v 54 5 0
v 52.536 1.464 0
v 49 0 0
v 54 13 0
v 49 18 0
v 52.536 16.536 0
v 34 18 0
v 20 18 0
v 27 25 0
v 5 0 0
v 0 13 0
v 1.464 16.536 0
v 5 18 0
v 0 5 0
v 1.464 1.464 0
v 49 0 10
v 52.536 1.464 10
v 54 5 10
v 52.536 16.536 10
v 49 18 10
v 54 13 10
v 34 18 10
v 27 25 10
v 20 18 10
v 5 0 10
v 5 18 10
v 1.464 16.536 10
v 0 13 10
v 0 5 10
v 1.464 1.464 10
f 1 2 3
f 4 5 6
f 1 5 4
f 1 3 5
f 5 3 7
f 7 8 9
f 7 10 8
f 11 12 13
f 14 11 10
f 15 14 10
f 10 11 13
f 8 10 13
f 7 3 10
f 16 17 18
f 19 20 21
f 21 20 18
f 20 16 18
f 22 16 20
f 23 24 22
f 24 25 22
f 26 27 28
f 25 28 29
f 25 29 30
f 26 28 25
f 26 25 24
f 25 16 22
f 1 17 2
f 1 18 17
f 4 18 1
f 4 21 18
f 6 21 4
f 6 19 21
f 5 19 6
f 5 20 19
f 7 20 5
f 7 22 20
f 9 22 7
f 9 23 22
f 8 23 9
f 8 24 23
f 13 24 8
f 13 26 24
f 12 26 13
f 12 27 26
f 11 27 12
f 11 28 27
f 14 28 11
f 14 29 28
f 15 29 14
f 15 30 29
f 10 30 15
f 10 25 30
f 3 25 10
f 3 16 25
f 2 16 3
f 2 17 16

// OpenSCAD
$fn = 32;

// ----------------------------------------------------------------------
// Ratchet pawl: 54 x 18 mm body, beak 7 mm сверху
// ----------------------------------------------------------------------

// --- parameters (mm) ---
profile_height = 10;      // extrusion height
profile_points = 15;      // points of the closed outline

profile = [[0, 5], [1.464, 1.464], [5, 0], [49, 0], [52.536, 1.464], [54, 5], [54, 13], [52.536, 16.536], [49, 18], [34, 18], [27, 25], [20, 18], [5, 18], [1.464, 16.536], [0, 13]];  // single closed polygon, 15 points, counter clockwise

// --- the one profile operation ---
linear_extrude(height = profile_height) polygon(points = profile);
